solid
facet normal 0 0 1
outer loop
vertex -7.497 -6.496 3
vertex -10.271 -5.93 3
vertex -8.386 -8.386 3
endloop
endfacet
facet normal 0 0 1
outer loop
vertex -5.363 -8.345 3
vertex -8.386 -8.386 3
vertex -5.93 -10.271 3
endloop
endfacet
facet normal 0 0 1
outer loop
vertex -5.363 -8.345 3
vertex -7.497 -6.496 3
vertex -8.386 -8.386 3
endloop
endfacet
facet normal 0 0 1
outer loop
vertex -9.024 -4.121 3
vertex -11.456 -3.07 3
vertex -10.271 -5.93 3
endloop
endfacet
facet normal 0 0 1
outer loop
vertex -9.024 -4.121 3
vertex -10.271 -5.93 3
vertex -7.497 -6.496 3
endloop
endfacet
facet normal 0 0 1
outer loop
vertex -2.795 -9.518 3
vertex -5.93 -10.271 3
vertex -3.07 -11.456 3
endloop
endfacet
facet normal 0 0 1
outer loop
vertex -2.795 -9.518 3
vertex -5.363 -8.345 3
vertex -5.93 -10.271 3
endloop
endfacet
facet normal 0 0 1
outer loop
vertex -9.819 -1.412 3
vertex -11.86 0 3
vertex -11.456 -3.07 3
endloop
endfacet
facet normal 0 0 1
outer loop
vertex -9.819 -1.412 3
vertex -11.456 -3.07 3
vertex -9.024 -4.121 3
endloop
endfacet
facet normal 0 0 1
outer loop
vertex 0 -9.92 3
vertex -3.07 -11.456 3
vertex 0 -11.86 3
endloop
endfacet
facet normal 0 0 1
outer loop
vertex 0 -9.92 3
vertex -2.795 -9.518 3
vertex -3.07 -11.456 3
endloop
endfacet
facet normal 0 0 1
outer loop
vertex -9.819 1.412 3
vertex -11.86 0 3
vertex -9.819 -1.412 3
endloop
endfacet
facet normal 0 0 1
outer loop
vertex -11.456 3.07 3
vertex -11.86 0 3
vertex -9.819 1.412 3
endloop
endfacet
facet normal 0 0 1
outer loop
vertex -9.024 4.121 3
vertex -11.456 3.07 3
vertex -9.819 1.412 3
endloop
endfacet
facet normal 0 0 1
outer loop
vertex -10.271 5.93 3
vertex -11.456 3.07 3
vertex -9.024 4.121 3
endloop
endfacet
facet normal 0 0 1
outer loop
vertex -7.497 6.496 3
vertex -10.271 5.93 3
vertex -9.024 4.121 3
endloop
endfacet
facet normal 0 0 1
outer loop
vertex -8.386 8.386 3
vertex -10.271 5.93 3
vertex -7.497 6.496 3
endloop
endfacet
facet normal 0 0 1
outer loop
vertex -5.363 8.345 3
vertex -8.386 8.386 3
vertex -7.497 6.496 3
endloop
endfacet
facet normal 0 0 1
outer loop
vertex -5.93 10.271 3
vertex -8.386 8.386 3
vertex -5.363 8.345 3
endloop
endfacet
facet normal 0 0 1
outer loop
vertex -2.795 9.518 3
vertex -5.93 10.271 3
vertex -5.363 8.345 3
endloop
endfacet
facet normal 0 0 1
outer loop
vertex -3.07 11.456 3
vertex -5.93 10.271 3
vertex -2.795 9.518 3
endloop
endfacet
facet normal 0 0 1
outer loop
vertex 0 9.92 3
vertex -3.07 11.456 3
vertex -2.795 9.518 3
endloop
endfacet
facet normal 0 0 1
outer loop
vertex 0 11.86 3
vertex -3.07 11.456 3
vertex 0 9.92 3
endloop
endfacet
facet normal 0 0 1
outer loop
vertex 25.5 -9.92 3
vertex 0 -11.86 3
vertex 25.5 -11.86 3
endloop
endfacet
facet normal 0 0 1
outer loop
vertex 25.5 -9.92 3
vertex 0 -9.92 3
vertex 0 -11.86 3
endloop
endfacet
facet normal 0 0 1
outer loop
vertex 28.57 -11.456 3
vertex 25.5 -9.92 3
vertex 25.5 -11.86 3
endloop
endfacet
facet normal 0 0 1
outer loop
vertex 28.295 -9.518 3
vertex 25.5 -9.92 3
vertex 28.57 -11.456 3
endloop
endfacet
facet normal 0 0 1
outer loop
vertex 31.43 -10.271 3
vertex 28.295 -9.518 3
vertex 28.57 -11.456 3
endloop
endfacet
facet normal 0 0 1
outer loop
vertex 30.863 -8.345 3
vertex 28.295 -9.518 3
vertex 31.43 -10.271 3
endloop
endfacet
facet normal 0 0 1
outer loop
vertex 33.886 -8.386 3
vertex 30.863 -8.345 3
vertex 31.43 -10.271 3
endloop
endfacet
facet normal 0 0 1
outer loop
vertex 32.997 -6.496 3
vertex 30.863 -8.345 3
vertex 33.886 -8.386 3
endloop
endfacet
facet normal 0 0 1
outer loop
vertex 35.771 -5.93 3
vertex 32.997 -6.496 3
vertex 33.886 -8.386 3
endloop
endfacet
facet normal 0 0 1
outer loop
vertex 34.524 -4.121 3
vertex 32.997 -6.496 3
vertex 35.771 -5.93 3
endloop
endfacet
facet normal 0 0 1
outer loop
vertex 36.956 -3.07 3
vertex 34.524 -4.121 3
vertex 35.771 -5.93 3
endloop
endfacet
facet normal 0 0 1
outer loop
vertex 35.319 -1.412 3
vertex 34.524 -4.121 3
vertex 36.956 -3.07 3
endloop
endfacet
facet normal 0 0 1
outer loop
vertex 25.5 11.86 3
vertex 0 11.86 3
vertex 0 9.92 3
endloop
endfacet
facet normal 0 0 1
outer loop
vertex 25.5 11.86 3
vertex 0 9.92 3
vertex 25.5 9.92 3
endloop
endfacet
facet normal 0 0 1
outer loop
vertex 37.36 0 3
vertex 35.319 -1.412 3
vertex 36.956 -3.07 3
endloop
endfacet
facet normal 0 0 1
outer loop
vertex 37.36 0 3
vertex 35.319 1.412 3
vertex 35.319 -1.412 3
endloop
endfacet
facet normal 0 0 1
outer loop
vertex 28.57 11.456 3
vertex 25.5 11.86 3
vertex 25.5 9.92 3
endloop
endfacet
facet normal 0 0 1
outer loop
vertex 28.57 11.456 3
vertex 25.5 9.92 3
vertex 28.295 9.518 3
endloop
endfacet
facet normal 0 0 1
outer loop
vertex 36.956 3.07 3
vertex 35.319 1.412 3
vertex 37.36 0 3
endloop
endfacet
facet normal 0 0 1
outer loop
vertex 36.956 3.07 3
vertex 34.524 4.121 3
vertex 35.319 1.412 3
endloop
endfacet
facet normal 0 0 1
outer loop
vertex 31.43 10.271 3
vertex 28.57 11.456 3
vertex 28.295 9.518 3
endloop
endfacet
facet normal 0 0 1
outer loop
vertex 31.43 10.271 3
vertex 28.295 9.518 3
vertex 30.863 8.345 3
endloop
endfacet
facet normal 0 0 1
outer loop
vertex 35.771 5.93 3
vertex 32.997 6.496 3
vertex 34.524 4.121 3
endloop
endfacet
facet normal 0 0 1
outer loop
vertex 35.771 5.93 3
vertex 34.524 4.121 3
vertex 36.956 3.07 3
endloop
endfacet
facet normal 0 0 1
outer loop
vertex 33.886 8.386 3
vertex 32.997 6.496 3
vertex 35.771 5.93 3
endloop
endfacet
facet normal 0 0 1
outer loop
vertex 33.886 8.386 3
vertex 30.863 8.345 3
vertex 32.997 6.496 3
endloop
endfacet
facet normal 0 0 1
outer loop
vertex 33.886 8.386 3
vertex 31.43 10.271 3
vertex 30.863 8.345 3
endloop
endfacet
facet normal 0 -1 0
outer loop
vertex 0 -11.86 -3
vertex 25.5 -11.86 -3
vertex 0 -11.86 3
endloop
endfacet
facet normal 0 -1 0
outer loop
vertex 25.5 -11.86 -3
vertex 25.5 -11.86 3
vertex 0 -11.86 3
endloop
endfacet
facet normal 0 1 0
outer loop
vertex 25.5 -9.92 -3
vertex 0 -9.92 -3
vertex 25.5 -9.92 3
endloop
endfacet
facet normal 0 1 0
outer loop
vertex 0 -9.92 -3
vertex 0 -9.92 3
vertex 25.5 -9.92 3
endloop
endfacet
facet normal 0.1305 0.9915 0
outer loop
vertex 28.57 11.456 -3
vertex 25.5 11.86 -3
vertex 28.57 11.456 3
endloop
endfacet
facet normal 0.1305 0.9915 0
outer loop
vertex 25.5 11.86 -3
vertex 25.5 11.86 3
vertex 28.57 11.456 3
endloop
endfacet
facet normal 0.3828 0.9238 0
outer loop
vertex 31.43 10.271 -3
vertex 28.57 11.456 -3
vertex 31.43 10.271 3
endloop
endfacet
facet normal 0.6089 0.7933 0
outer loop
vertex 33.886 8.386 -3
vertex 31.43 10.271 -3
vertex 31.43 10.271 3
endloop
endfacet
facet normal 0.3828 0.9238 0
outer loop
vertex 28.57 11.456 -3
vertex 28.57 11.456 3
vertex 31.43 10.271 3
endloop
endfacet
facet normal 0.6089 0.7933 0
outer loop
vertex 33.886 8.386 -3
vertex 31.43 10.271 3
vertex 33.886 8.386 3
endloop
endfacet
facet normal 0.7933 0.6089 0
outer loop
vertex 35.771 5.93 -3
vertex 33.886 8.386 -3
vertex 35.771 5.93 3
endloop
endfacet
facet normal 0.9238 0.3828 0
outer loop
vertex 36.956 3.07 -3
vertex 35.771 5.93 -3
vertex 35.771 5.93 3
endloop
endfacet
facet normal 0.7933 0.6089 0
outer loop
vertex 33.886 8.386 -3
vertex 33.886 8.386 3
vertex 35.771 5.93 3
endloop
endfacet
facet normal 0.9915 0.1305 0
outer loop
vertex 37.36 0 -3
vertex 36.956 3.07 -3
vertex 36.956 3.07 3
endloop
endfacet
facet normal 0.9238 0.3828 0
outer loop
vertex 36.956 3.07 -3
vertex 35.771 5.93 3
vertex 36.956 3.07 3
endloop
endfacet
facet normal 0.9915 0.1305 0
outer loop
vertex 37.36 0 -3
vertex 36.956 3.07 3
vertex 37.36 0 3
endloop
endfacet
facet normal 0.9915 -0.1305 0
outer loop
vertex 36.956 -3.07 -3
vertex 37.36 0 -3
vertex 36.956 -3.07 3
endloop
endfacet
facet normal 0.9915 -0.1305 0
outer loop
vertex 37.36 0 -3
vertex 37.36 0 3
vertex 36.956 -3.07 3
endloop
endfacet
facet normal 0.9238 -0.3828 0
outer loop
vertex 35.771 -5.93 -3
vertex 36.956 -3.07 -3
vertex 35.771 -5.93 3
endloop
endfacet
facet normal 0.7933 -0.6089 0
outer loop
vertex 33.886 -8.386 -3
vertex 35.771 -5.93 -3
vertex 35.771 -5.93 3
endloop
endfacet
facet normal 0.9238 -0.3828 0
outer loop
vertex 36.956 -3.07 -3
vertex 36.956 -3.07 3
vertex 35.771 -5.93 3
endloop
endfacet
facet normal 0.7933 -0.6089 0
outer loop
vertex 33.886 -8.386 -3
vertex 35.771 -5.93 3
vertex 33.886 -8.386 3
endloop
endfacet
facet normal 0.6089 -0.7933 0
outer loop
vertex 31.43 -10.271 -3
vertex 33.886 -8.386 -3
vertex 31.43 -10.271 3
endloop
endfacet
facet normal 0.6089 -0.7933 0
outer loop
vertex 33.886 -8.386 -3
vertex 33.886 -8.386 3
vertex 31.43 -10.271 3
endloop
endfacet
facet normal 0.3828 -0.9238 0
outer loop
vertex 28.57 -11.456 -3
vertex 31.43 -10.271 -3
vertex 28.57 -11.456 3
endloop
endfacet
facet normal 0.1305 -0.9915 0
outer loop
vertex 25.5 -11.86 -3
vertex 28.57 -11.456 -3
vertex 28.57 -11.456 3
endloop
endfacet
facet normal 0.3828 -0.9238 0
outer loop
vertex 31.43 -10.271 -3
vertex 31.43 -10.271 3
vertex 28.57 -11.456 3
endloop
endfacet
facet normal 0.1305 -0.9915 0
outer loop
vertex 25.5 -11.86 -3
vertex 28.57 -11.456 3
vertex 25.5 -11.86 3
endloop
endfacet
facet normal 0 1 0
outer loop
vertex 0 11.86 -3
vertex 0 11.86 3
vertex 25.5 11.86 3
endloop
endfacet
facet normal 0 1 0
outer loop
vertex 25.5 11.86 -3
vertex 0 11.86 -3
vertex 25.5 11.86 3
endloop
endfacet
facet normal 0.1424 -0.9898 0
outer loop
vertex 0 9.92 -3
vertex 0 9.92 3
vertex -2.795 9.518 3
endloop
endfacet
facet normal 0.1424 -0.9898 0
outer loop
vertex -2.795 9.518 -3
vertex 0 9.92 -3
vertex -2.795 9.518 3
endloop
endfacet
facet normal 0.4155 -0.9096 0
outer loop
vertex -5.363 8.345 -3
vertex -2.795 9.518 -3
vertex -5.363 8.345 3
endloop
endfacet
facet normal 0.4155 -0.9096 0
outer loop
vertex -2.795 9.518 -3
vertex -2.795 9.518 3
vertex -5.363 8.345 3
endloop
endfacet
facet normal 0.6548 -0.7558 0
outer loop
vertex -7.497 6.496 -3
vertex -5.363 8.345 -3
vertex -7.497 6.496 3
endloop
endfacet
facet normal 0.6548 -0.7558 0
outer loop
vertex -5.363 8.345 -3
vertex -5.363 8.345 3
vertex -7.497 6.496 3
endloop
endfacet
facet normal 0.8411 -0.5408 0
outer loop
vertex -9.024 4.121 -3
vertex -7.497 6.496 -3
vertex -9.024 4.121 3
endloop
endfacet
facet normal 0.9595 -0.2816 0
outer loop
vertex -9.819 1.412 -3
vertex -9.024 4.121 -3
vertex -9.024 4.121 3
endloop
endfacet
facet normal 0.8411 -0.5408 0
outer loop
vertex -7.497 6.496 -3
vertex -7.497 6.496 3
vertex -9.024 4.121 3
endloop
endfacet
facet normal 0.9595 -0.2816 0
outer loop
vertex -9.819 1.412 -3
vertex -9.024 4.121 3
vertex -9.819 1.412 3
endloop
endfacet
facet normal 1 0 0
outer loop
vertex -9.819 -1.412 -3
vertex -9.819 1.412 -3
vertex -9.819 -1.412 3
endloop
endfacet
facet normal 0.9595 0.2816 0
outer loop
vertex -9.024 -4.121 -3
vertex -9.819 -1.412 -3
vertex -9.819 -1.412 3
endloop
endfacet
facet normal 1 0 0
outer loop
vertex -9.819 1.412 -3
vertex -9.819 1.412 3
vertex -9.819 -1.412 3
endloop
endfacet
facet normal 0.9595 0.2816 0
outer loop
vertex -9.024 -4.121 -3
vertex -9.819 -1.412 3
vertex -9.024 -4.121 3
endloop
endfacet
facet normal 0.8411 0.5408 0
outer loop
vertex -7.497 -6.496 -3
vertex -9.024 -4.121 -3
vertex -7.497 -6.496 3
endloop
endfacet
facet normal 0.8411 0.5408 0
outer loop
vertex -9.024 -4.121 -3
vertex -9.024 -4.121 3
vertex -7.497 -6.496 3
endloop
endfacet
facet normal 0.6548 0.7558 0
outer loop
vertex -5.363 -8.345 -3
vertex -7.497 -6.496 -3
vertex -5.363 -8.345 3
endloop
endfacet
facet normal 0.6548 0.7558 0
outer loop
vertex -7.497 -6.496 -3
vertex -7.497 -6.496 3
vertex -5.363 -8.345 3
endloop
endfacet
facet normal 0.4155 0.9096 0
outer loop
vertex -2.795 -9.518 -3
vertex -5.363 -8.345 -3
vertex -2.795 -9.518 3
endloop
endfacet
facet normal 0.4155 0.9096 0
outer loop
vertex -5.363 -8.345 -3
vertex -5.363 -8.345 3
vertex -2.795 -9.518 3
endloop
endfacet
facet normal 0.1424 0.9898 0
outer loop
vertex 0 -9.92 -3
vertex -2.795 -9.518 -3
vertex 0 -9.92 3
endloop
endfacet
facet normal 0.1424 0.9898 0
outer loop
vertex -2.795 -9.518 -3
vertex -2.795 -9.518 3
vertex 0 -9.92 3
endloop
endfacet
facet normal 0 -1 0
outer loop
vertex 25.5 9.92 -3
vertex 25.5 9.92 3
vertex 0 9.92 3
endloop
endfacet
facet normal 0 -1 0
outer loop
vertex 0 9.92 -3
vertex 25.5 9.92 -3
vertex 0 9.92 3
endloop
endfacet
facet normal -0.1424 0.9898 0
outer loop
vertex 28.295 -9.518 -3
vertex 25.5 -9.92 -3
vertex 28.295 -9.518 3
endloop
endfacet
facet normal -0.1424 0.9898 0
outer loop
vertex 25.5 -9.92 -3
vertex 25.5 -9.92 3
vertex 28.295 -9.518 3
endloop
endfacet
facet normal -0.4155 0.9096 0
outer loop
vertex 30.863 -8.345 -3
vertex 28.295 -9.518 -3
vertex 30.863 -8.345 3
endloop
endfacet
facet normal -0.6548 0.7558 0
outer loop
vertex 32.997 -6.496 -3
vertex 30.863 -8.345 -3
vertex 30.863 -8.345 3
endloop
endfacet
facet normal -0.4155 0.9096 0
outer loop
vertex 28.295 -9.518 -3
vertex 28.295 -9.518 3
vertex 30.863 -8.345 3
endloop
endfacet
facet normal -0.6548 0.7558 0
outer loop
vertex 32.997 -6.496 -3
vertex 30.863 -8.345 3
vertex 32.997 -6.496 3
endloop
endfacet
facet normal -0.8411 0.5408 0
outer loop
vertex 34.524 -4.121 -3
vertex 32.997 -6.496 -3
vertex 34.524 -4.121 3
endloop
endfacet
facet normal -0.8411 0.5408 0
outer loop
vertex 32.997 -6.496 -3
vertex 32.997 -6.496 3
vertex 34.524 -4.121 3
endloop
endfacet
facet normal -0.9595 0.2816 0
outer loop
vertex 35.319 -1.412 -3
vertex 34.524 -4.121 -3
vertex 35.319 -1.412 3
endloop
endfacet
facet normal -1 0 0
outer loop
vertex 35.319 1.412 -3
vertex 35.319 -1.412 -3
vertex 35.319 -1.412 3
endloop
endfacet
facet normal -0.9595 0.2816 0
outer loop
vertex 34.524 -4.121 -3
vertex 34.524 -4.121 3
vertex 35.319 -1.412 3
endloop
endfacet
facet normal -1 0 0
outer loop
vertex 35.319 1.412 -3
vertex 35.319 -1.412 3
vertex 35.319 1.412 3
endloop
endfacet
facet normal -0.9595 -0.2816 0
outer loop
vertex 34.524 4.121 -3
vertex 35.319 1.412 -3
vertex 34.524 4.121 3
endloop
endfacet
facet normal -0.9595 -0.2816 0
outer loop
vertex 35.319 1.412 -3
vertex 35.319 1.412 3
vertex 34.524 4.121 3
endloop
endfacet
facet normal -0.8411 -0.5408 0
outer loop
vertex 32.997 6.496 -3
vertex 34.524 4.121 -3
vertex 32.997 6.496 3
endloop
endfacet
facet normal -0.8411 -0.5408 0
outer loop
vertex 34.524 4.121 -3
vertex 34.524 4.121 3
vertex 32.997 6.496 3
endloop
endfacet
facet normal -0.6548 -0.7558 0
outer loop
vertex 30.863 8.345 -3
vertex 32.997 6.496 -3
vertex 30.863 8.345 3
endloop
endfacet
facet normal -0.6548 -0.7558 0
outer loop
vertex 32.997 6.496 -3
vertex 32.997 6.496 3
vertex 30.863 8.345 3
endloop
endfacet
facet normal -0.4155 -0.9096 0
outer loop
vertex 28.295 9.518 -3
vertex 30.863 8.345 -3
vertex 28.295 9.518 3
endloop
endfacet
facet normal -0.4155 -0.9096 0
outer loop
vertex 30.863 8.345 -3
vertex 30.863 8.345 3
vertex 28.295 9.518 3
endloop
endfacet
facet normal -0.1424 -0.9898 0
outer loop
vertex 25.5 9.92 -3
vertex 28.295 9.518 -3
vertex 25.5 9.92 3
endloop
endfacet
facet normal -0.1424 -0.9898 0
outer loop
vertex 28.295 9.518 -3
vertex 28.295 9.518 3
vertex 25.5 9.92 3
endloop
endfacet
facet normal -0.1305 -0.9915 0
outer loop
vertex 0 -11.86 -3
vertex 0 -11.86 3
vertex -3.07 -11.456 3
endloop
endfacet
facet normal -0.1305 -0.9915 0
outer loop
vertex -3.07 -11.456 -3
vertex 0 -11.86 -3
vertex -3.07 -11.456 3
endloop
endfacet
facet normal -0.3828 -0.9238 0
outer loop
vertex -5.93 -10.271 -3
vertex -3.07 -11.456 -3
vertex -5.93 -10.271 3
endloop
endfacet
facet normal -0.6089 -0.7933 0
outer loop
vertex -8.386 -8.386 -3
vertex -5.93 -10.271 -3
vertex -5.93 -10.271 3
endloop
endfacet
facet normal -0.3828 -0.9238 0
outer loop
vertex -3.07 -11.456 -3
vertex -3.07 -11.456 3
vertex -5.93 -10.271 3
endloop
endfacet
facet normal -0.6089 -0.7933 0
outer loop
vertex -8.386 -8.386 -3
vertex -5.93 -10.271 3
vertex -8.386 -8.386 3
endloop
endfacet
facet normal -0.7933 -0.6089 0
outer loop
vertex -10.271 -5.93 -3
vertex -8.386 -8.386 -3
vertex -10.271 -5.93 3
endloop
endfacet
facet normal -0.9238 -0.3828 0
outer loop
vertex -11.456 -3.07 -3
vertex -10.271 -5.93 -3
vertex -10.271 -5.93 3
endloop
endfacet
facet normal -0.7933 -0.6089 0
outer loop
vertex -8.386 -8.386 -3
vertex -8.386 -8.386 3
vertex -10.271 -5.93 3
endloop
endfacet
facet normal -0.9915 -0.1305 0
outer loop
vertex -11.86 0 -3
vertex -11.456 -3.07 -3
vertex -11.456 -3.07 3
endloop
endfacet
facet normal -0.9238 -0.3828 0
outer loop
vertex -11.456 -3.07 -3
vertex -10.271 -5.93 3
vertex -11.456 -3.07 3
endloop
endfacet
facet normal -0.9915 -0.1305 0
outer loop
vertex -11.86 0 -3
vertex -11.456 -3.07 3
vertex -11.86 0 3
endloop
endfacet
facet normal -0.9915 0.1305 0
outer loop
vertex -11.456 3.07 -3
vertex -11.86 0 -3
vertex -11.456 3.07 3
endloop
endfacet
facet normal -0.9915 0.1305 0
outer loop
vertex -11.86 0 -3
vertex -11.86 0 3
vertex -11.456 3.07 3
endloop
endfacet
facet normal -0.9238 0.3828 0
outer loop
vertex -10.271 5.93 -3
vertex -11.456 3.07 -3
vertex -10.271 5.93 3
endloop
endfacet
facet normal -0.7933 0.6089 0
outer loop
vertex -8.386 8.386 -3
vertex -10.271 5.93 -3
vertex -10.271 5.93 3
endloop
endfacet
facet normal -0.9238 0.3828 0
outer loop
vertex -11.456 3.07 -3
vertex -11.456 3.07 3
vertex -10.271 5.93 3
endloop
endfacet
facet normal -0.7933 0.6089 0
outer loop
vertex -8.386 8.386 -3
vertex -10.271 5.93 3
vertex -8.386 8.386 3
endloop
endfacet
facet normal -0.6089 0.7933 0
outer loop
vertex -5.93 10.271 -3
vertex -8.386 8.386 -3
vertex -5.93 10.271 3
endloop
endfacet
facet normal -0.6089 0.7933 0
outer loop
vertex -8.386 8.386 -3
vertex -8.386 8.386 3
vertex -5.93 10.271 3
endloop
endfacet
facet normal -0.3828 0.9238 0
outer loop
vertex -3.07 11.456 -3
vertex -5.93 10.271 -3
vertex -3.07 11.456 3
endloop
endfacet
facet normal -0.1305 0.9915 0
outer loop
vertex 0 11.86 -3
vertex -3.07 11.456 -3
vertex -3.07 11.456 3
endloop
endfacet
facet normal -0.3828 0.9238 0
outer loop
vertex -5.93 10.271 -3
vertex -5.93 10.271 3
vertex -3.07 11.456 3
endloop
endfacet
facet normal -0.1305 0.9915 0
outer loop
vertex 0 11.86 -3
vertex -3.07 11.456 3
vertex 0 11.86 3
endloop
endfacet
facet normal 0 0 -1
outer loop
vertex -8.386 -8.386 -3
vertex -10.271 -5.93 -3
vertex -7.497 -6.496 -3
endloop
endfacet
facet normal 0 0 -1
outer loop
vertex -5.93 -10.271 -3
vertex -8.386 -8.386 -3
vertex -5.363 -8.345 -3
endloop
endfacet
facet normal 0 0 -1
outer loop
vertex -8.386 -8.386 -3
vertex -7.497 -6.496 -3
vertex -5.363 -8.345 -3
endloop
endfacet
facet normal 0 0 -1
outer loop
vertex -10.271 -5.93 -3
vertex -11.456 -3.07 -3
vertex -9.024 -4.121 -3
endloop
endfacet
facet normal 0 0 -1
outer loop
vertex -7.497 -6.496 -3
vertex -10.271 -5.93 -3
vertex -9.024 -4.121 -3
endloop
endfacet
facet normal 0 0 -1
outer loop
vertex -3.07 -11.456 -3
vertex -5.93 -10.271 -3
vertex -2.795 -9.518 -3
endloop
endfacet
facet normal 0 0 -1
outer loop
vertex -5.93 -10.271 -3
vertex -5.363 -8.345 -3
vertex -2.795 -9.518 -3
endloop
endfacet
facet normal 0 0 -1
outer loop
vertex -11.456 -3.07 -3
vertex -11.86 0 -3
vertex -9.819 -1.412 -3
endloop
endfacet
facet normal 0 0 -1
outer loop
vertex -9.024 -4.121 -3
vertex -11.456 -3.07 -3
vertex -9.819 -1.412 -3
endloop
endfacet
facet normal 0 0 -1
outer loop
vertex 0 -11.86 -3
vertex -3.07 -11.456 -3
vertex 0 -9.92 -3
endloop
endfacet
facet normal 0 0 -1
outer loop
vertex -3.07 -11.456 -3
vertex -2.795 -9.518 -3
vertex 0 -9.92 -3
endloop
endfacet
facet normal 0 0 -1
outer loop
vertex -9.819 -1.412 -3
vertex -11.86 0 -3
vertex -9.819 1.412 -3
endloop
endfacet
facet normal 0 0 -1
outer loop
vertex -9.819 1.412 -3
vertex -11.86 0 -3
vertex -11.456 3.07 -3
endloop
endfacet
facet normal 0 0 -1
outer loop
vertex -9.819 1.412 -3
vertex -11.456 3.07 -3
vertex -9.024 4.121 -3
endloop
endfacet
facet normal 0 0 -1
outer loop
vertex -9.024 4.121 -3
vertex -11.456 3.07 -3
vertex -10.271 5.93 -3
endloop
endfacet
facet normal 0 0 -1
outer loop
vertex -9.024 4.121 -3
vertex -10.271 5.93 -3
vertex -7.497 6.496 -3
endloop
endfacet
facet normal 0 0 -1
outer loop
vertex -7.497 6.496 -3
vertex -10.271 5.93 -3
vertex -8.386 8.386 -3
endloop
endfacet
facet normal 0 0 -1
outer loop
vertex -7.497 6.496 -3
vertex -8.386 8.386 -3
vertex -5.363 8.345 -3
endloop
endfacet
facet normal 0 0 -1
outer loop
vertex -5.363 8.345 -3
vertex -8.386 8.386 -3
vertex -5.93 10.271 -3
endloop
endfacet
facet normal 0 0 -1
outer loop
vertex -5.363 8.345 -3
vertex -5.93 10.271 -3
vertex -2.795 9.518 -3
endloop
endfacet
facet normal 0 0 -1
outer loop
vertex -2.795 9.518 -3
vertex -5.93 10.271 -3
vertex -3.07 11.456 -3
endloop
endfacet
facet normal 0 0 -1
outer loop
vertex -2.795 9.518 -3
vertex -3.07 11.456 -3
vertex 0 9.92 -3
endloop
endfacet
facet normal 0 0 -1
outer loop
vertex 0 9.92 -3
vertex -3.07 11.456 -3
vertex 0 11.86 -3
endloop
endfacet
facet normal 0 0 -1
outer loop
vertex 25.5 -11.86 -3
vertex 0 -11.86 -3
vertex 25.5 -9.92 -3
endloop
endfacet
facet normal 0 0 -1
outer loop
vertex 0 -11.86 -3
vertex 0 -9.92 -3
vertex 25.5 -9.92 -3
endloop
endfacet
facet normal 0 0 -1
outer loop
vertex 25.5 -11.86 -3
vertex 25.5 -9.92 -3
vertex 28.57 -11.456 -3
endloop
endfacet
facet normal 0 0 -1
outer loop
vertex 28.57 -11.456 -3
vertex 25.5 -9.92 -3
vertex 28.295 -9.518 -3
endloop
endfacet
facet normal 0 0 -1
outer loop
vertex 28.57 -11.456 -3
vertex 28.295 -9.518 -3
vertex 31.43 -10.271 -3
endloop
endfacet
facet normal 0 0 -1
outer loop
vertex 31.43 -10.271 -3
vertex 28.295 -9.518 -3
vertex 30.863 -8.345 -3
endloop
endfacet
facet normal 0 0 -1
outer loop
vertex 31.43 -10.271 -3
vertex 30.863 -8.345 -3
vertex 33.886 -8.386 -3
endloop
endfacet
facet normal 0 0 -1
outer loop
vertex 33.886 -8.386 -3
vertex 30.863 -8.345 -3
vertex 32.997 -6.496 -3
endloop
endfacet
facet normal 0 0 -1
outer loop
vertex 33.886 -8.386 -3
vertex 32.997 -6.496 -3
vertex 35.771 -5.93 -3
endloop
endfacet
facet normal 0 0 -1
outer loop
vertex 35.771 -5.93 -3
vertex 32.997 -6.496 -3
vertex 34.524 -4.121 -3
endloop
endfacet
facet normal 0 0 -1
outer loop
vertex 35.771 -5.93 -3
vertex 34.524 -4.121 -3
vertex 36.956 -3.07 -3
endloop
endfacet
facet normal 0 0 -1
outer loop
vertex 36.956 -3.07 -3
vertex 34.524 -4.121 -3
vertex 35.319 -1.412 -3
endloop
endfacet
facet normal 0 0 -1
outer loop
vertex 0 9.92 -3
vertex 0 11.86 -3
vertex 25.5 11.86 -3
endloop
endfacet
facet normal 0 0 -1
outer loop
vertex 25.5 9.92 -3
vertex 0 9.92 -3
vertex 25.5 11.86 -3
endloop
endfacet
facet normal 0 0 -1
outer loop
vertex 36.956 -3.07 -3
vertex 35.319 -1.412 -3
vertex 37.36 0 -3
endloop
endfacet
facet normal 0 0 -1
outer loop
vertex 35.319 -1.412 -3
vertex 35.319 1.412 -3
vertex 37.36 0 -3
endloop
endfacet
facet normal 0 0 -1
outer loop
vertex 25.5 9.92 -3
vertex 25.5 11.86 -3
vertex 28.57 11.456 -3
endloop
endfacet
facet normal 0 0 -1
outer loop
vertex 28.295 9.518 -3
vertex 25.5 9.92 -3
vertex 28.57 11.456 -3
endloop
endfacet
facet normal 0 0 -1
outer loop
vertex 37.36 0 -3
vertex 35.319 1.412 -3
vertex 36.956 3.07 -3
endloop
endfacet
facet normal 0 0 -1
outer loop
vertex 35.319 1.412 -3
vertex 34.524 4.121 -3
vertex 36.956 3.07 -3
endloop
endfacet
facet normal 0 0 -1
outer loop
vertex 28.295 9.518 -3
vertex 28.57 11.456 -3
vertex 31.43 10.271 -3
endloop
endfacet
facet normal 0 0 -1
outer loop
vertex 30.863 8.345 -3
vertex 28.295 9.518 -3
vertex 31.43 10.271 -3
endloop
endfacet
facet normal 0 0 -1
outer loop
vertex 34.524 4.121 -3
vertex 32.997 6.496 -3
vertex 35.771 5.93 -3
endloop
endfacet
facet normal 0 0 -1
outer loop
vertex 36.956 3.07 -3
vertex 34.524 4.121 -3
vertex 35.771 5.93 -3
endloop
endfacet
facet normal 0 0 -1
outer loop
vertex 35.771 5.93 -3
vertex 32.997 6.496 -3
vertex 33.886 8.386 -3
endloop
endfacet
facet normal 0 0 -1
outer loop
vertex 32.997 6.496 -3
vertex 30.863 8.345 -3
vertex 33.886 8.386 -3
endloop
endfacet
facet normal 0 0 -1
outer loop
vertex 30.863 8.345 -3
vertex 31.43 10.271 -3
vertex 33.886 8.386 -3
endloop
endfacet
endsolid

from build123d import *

# Parameters (mm, degrees)
BOSS_EXTRU_1_DEPTH = 3


with BuildPart() as part:
    # Esquisse1 → Boss.-Extru.1 (new, symmetric)
    # profile 1 of 2: a face of its own
    with BuildSketch(Plane.XY):
        with BuildLine():
            Line((0, 11.86), (25.5, 11.86))
            ThreePointArc((25.5, 11.86), (37.36, 0), (25.5, -11.86))
            Line((25.5, -11.86), (0, -11.86))
            ThreePointArc((0, -11.86), (-11.86, 0), (0, 11.86))
        make_face()
        with BuildLine():
            ThreePointArc((25.5, -11.46), (36.96, 0), (25.5, 11.46))
            Line((25.5, 11.46), (0, 11.46))
            ThreePointArc((0, 11.46), (-11.46, 0), (0, -11.46))
            Line((0, -11.46), (25.5, -11.46))
        make_face(mode=Mode.SUBTRACT)
    # profile 2 of 2: a face of its own
    with BuildSketch(Plane.XY):
        with BuildLine():
            Line((0, -11.46), (25.5, -11.46))
            ThreePointArc((25.5, -11.46), (36.96, 0), (25.5, 11.46))
            Line((25.5, 11.46), (0, 11.46))
            ThreePointArc((0, 11.46), (-11.46, 0), (0, -11.46))
        make_face()
        with BuildLine():
            ThreePointArc((0, 9.92), (-9.92, 0), (0, -9.92))
            Line((0, -9.92), (25.5, -9.92))
            ThreePointArc((25.5, -9.92), (35.42, 0), (25.5, 9.92))
            Line((25.5, 9.92), (0, 9.92))
        make_face(mode=Mode.SUBTRACT)
    extrude(amount=BOSS_EXTRU_1_DEPTH, both=True)


solid = part.part
